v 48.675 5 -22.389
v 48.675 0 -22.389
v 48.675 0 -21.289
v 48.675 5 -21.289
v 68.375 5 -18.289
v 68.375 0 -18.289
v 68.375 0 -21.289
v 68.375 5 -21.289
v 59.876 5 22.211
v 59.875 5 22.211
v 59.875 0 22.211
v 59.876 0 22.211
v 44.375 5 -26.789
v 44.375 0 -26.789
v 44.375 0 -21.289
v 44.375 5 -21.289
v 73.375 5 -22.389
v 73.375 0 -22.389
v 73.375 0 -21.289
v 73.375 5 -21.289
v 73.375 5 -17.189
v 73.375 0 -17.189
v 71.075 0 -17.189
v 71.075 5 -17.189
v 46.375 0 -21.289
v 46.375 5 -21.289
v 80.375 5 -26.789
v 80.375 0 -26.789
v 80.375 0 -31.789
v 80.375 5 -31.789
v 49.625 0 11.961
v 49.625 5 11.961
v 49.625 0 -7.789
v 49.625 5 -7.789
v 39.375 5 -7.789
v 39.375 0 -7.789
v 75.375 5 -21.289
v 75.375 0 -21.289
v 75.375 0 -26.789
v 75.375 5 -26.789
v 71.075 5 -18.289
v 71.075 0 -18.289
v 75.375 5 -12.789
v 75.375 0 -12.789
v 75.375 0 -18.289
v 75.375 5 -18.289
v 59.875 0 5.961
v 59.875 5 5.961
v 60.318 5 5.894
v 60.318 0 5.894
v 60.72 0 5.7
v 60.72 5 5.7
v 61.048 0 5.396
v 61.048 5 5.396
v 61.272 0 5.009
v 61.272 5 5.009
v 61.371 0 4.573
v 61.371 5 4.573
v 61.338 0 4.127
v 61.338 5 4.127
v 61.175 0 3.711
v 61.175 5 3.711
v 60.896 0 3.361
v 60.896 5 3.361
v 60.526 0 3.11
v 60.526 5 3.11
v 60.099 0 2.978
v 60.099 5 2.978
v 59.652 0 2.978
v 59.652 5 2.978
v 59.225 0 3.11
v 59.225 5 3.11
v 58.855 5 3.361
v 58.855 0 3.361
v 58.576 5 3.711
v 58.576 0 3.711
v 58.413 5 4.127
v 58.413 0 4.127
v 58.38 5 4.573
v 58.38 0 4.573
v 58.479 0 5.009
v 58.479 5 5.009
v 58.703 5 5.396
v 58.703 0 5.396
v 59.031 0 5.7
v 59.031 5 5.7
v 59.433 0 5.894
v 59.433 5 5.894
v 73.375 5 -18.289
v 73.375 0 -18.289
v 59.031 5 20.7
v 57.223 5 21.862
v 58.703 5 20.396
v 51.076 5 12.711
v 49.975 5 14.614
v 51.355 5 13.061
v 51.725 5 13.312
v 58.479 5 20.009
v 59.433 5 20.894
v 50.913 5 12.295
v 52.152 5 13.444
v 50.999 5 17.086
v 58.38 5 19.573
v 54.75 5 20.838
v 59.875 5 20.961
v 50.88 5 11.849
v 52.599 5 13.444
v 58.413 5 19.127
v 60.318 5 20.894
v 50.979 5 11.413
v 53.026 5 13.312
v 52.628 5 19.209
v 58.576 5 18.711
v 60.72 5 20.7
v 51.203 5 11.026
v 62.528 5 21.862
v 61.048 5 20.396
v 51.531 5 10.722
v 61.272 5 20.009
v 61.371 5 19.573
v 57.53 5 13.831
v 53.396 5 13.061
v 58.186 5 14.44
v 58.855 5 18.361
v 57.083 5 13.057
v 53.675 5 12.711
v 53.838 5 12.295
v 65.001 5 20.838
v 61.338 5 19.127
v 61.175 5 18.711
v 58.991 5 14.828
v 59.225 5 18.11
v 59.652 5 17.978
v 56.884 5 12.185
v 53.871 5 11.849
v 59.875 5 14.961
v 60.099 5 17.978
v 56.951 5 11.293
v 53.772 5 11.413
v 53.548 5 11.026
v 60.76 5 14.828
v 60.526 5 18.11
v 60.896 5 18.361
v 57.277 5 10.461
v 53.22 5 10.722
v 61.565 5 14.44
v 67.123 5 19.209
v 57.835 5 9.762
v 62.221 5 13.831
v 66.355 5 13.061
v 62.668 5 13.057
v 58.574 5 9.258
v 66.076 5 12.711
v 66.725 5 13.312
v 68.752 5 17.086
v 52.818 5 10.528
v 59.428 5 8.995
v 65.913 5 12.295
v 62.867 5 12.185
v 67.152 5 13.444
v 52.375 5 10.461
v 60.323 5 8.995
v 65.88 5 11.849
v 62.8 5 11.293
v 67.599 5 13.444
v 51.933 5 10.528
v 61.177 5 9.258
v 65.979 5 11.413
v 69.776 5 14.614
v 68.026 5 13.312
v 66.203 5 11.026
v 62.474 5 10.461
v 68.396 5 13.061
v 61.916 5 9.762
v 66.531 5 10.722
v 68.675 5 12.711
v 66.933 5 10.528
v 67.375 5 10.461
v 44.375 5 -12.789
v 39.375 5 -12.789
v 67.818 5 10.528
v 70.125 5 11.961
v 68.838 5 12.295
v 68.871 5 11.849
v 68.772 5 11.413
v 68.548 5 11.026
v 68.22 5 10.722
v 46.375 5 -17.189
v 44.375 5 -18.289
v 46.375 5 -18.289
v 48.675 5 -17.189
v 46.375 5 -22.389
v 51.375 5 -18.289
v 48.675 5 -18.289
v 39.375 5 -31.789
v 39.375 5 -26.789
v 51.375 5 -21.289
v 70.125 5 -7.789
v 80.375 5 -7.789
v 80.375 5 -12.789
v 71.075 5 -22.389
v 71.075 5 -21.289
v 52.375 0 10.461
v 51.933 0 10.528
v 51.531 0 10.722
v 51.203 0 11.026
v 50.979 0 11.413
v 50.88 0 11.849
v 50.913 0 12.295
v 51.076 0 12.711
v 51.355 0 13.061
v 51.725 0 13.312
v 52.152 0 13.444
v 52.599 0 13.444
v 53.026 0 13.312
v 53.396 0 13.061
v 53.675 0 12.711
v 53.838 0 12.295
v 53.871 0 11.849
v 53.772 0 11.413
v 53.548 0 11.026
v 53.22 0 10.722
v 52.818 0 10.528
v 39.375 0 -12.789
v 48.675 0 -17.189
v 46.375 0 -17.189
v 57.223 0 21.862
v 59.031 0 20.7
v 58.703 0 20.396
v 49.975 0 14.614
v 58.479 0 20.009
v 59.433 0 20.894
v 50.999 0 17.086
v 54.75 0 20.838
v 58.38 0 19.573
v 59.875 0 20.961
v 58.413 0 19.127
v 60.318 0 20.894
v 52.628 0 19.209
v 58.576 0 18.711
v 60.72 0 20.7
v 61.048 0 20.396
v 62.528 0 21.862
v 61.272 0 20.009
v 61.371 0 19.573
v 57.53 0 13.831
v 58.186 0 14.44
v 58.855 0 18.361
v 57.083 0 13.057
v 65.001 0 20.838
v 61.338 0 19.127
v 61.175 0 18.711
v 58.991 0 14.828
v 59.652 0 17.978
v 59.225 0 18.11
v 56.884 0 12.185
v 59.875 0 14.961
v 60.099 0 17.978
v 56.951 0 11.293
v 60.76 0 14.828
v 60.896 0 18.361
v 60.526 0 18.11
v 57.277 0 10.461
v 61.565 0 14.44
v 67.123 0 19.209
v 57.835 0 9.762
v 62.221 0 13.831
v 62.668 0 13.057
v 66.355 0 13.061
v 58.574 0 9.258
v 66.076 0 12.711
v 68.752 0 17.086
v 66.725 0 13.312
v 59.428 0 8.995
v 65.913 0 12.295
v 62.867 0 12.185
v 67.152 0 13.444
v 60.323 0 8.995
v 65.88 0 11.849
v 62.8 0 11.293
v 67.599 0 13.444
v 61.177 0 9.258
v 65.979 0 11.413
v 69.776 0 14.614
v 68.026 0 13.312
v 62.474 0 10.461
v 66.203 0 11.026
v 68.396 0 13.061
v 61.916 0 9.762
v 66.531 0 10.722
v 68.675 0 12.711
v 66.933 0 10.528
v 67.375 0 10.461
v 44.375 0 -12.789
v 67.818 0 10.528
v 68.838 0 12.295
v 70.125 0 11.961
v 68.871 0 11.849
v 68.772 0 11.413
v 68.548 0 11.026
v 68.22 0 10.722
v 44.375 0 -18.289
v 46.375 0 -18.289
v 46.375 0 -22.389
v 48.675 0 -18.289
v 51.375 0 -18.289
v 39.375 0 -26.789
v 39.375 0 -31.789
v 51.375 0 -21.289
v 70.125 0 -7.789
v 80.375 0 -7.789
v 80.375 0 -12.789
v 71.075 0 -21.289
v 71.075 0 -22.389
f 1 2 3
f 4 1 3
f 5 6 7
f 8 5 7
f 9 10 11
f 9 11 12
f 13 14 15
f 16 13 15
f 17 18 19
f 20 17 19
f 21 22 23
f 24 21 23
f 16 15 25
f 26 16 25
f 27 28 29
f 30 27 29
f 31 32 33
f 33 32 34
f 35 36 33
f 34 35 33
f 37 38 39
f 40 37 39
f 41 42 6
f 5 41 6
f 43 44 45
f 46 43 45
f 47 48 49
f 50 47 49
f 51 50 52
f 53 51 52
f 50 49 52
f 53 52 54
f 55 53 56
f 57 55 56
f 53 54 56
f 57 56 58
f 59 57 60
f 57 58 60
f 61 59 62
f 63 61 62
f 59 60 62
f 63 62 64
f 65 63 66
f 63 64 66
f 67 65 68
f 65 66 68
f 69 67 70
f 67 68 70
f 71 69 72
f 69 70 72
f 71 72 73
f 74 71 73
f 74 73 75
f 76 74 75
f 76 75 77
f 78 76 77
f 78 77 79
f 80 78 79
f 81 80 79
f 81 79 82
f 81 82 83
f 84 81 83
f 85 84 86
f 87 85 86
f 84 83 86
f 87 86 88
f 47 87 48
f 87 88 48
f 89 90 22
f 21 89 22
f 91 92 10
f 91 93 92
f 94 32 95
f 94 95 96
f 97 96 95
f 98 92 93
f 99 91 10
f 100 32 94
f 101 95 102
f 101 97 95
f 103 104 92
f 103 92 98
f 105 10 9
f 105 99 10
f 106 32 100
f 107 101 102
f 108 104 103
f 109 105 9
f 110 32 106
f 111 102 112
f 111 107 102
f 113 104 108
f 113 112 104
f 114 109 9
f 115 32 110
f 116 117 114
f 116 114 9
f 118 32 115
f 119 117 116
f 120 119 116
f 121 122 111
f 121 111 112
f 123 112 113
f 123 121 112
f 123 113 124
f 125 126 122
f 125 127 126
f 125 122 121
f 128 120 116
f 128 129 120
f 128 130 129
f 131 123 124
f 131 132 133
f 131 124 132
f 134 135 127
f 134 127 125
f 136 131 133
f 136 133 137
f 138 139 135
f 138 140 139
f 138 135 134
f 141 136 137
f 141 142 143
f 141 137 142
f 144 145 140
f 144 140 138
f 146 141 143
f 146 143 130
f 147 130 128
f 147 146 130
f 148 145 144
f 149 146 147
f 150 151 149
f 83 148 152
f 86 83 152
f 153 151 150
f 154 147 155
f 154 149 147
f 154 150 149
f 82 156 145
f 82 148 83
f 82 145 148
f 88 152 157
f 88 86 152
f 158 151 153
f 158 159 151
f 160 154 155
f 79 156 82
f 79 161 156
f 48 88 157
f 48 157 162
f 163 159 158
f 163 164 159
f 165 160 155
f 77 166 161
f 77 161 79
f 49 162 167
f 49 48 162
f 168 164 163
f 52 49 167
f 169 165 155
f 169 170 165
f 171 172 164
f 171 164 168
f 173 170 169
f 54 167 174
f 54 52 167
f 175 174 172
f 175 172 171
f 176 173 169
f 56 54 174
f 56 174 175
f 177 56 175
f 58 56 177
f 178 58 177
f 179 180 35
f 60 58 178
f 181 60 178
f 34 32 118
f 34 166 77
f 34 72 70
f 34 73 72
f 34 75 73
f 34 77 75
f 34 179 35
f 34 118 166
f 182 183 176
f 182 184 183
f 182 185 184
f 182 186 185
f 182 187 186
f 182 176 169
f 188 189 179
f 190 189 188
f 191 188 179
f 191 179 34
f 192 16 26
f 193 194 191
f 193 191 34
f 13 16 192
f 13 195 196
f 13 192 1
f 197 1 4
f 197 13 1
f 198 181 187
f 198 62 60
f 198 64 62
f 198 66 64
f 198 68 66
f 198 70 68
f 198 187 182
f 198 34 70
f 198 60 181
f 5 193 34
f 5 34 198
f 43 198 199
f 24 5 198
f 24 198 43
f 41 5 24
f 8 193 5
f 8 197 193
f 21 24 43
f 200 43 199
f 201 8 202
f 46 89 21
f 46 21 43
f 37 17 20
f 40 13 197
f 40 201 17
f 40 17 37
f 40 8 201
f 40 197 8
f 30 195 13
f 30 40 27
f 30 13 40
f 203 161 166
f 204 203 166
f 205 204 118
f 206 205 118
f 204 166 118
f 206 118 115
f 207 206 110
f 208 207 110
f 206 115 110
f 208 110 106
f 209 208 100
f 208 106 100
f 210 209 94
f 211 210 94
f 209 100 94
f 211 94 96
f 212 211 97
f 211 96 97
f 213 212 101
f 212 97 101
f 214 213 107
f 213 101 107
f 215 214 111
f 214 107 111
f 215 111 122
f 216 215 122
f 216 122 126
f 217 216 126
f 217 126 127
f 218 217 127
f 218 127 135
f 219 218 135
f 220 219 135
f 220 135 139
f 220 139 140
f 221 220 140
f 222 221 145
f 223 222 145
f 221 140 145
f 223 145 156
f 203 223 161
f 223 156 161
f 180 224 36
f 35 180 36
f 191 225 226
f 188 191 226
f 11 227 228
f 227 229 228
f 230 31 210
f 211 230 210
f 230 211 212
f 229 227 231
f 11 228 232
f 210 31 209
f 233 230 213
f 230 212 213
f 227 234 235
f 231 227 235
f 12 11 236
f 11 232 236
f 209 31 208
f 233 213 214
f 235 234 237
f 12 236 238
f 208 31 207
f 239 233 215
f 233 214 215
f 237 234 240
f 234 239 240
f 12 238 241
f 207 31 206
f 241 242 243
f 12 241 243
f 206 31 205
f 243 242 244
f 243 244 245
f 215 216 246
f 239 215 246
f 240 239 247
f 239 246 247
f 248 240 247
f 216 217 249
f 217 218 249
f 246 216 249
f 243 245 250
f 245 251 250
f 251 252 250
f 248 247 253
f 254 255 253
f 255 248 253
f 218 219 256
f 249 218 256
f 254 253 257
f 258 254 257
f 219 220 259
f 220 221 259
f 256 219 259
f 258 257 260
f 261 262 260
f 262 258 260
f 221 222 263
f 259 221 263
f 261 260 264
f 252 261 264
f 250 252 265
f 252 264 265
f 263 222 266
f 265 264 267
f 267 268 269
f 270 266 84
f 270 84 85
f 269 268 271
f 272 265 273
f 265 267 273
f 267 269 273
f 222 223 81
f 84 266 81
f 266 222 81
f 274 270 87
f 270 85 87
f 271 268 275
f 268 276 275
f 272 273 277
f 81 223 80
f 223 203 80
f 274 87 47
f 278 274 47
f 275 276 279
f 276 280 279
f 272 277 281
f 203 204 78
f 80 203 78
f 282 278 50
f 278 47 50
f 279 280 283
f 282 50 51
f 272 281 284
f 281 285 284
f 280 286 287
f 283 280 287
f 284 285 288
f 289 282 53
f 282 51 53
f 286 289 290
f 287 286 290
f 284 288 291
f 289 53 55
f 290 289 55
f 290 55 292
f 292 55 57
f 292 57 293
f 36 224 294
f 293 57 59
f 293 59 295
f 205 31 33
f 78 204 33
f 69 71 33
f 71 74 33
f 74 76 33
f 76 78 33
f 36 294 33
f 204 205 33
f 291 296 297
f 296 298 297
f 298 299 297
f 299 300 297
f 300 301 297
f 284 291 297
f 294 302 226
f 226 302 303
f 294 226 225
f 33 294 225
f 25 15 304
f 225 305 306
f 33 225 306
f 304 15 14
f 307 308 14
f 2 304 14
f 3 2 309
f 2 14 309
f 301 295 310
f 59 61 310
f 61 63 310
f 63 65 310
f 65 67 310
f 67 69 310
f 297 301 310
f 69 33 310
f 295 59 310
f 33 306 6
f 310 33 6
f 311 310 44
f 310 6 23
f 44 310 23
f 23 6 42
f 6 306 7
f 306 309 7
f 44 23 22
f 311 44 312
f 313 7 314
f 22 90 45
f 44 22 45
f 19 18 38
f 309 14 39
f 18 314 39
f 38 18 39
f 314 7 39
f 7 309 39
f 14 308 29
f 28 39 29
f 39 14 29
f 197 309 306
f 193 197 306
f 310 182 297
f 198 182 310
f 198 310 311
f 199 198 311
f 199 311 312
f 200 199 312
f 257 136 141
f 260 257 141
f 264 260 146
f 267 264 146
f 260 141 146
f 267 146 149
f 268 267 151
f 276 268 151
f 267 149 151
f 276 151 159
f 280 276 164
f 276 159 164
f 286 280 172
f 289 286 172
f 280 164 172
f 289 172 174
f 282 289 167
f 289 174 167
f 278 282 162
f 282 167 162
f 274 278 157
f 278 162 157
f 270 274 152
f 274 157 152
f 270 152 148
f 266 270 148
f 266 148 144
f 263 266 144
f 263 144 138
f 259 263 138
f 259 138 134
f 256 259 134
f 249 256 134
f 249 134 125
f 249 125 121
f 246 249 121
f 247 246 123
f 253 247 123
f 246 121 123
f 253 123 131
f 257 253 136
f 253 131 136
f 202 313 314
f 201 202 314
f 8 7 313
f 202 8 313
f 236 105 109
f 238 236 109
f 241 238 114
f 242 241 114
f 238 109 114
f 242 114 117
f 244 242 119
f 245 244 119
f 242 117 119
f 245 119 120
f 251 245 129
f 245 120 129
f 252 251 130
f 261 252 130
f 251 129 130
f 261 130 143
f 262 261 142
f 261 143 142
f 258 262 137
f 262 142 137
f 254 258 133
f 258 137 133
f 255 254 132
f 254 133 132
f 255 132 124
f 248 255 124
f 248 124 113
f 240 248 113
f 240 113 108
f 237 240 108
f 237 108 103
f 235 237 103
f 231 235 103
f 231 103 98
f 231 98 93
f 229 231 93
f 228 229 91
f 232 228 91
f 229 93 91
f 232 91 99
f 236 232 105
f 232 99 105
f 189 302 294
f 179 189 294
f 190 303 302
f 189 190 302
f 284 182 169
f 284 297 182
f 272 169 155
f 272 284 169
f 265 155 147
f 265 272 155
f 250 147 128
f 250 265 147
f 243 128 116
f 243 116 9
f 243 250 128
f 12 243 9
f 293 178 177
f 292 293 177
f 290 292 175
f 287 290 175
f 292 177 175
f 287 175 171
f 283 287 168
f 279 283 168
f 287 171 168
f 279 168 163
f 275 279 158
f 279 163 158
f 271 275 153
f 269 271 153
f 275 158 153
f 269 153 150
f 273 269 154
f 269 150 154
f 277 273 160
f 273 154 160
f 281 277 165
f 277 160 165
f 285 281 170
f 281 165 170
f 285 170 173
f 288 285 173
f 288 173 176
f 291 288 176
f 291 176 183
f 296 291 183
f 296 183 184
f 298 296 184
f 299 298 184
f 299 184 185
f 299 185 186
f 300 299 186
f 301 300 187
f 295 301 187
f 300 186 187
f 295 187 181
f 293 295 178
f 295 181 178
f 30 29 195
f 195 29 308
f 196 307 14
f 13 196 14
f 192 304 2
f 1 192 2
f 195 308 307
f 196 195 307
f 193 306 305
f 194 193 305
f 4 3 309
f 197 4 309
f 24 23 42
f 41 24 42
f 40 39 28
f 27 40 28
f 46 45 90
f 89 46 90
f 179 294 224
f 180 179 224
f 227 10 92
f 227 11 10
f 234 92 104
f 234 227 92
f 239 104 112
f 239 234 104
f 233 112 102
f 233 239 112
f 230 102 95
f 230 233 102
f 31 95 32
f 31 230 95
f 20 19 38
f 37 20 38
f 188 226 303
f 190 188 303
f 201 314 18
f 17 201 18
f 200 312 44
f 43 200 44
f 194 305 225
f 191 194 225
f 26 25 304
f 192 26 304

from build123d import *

# Parameters (mm, degrees)
BOSS_EXTRUDE1_DEPTH = 5
SKETCH2_W           = 20.5
SKETCH2_H           = 30
SKETCH2_R           = 3
SKETCH2_R_2         = 1.5
BOSS_EXTRUDE2_DEPTH = 5
FILLET1_R           = 10.25


with BuildPart() as part:
    # Sketch1 → Boss-Extrude1 (new body)
    with BuildSketch(Plane(origin=(0, 0, 0), x_dir=(1, 0, 0), z_dir=(0, 1, 0))):
        Polygon((44.375484097, 7.788988346), (75.375484097, 7.788988346), (80.375484097, 7.788988346), (80.375484097, 12.788988346), (75.375484097, 12.788988346), (75.375484097, 18.288988346), (73.375484097, 18.288988346), (73.375484097, 17.188988346), (71.075484097, 17.188988346), (71.075484097, 18.288988346), (68.375484097, 18.288988346), (68.375484097, 21.288988346), (71.075484097, 21.288988346), (71.075484097, 22.388988346), (73.375484097, 22.388988346), (73.375484097, 21.288988346), (75.375484097, 21.288988346), (75.375484097, 26.788988346), (80.375484097, 26.788988346), (80.375484097, 31.788988346), (75.375484097, 31.788988346), (44.375484097, 31.788988346), (39.375484097, 31.788988346), (39.375484097, 26.788988346), (44.375484097, 26.788988346), (44.375484097, 21.288988346), (46.375484097, 21.288988346), (46.375484097, 22.388988346), (48.675484097, 22.388988346), (48.675484097, 21.288988346), (51.375484097, 21.288988346), (51.375484097, 18.288988346), (48.675484097, 18.288988346), (48.675484097, 17.188988346), (46.375484097, 17.188988346), (46.375484097, 18.288988346), (44.375484097, 18.288988346), (44.375484097, 12.788988346), (39.375484097, 12.788988346), (39.375484097, 7.788988346), align=None)
    extrude(amount=BOSS_EXTRUDE1_DEPTH)

    # Sketch2 → Boss-Extrude2 (add)
    with BuildSketch(Plane(origin=(0, 5, 0), x_dir=(1, 0, 0), z_dir=(0, 1, 0))):
        with Locations((59.875484097, -7.211011654)):
            Rectangle(SKETCH2_W, SKETCH2_H)
        with Locations(Location((59.875484097, -11.961011654, 0), (0, 0, 270))):
            Circle(SKETCH2_R, mode=Mode.SUBTRACT)
        with Locations(Location((59.875484097, -19.461011654, 0), (0, 0, 270))):
            Circle(SKETCH2_R_2, mode=Mode.SUBTRACT)
        with Locations(Location((52.375484097, -11.961011654, 0), (0, 0, 90))):
            Circle(SKETCH2_R_2, mode=Mode.SUBTRACT)
        with Locations(Location((67.375484097, -11.961011654, 0), (0, 0, 90))):
            Circle(SKETCH2_R_2, mode=Mode.SUBTRACT)
        with Locations(Location((59.875484097, -4.461011654, 0), (0, 0, 270))):
            Circle(SKETCH2_R_2, mode=Mode.SUBTRACT)
    extrude(amount=-BOSS_EXTRUDE2_DEPTH)

    # Fillet1
    fillet1_edges = [part.edges().sort_by_distance(p)[0] for p in [
        (49.625484097, 2.5, 22.211011654),
        (70.125484097, 2.5, 22.211011654),
    ]]
    fillet(fillet1_edges, radius=FILLET1_R - 0.0001)  # a hair under: the kernel refuses the full size


solid = part.part
